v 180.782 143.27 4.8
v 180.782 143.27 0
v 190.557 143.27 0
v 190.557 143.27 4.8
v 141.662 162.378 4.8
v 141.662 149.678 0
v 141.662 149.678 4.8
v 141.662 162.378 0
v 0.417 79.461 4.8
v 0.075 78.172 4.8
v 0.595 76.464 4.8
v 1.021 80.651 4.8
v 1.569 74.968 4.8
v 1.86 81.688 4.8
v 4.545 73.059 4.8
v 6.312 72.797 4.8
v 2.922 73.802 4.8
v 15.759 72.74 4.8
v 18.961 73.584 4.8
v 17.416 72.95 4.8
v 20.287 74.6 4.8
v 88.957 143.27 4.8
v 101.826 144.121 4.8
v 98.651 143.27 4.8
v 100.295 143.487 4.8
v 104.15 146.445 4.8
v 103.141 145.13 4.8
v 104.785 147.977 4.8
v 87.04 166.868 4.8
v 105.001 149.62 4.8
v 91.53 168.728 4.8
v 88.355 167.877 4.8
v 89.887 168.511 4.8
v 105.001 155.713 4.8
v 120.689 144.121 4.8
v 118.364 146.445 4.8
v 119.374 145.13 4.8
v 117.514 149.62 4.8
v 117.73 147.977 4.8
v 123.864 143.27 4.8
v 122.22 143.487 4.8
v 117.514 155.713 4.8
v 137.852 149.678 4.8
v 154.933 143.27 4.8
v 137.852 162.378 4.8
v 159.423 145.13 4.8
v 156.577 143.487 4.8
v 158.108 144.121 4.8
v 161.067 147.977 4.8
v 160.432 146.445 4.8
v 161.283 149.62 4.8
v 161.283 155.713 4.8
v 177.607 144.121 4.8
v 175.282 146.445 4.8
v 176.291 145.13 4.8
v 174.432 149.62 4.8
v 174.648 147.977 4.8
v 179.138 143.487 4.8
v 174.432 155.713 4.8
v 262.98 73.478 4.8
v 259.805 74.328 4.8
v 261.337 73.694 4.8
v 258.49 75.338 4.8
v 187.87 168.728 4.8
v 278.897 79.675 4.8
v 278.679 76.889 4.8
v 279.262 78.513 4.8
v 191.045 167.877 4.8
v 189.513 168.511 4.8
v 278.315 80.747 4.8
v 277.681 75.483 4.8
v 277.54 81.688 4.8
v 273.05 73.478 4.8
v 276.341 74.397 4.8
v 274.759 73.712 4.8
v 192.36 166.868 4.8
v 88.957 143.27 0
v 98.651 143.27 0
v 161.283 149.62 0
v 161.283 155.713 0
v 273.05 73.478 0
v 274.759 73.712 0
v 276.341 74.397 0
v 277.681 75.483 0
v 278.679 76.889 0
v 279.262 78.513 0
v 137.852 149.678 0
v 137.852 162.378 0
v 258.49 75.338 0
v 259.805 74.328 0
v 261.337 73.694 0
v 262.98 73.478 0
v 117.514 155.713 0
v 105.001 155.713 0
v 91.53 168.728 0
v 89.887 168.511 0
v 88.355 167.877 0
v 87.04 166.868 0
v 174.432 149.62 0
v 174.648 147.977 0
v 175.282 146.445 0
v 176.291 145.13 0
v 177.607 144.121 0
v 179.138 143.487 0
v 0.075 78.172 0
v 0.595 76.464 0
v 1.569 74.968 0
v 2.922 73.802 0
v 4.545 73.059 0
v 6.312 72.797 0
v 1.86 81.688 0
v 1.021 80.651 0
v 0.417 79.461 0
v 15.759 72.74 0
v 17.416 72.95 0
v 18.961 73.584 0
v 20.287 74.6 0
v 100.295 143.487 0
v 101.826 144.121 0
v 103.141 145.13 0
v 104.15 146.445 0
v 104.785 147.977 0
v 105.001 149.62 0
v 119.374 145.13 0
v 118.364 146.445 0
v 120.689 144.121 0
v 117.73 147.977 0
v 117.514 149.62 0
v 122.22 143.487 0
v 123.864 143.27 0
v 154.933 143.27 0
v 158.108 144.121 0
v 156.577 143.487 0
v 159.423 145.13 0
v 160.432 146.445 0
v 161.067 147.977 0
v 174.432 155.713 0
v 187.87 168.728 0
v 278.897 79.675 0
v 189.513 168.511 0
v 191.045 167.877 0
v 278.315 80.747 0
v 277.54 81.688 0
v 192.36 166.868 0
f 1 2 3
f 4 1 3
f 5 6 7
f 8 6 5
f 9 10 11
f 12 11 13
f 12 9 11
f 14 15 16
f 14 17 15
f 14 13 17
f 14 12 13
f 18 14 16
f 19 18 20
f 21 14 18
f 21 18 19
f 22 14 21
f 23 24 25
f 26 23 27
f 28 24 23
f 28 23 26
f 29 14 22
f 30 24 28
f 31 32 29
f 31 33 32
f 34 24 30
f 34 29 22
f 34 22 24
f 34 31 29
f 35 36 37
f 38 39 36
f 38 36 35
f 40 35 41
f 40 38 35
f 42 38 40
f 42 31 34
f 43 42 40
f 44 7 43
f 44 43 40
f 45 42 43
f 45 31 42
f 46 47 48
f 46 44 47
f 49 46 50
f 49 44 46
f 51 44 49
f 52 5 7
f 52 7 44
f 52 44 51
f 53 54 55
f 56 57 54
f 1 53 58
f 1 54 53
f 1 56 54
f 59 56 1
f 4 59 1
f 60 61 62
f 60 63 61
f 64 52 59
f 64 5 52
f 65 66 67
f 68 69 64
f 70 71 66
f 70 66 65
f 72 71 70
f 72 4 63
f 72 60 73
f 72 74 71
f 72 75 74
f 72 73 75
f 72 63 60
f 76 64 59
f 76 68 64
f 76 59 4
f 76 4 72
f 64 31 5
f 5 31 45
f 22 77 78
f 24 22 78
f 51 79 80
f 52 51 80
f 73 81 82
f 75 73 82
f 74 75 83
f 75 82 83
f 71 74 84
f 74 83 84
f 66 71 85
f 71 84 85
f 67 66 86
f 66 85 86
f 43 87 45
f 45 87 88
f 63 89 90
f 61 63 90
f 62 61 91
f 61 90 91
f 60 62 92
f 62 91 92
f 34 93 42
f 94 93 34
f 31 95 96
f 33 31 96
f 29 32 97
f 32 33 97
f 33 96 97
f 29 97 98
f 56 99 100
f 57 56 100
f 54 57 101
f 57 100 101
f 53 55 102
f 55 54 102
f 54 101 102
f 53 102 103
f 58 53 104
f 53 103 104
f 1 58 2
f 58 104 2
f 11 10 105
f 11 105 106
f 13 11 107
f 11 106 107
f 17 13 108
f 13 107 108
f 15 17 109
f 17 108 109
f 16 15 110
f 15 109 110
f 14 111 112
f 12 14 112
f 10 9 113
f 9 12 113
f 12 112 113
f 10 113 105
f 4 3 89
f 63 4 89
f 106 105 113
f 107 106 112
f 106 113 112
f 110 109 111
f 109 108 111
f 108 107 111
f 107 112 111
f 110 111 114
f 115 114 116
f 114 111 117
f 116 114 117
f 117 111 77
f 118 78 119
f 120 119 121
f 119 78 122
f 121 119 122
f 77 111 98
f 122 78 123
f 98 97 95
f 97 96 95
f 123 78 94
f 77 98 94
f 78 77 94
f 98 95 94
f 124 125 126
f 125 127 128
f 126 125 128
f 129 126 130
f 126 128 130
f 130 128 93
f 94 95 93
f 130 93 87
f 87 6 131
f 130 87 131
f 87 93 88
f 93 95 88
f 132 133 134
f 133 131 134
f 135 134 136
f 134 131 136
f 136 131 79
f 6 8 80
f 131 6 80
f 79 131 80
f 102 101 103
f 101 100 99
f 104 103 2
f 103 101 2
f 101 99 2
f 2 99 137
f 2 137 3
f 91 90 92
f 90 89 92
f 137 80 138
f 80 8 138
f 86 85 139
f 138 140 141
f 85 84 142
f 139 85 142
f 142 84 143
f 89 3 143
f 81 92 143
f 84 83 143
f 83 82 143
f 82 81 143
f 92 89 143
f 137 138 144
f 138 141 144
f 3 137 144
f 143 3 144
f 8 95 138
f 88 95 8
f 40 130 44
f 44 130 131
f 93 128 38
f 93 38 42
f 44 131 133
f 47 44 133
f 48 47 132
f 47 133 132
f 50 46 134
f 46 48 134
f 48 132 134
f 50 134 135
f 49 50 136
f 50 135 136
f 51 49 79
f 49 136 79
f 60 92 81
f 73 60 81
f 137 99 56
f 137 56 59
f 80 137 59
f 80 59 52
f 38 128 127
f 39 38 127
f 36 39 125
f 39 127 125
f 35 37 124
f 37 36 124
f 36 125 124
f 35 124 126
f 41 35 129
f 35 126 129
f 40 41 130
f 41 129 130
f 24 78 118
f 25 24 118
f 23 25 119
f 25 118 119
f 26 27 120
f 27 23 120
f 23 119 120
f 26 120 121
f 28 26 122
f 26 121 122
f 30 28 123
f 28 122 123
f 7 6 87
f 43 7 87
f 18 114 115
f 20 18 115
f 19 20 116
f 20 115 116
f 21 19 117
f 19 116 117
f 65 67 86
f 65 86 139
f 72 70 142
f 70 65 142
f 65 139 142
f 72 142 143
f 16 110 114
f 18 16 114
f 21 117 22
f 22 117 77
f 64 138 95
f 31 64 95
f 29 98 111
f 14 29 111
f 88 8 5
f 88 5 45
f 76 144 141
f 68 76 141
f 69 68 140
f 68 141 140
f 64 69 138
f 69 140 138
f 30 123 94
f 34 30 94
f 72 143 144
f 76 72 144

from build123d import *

# Parameters (mm, degrees)
SKETCH1_W           = 279.4
SKETCH1_H           = 254
BOSS_EXTRUDE1_DEPTH = 4.800000052
SKETCH4_W           = 13.148347957
SKETCH4_H           = 12.442555781
SKETCH4_W_2         = 3.81
SKETCH4_H_2         = 12.7
SKETCH4_W_3         = 12.512633495
CUT_EXTRUDE1_DEPTH  = 378.628653575
FILLET1_R           = 6.35


with BuildPart() as part:
    # Sketch1 → Boss-Extrude1 (new body)
    with BuildSketch(Plane.XY):
        with Locations((139.7, 127)):
            Rectangle(SKETCH1_W, SKETCH1_H)
    extrude(amount=BOSS_EXTRUDE1_DEPTH)

    # Sketch4 → Cut-Extrude1 (cut, through all)
    with BuildSketch(Plane(origin=(0, 0, 0), x_dir=(-1, 0, 0), z_dir=(0, 0, -1))):
        Polygon((0, 0), (0, 72.835400266), (-18.411229684, 72.724077305), (-88.95741747, 143.27026509), (-105.001094941, 143.27026509), (-117.513728436, 143.27026509), (-161.28323771, 143.27026509), (-174.431585667, 143.27026509), (-190.55741747, 143.27026509), (-260.35, 73.47768256), (-279.4, 73.47768256), (-279.4, 0), align=None)
        Polygon((-88.9, 168.72768256), (0, 79.82768256), (0, 254), (-279.4, 254), (-279.4, 79.82768256), (-190.5, 168.72768256), align=None)
        with Locations((-167.857411689, 149.491542981)):
            Rectangle(SKETCH4_W, SKETCH4_H)
        with Locations((-139.75741747, 156.02768256)):
            Rectangle(SKETCH4_W_2, SKETCH4_H_2)
        with Locations((-111.257411689, 149.491542981)):
            Rectangle(SKETCH4_W_3, SKETCH4_H)
    extrude(amount=-CUT_EXTRUDE1_DEPTH, mode=Mode.SUBTRACT)

    # Fillet1
    # the kernel refuses this fillet: 6.35 mm, written as the material it takes off along each edge
    with BuildSketch(Plane(origin=(105.001094941, 143.27026509, -15.875), x_dir=(0, 1, 0), z_dir=(0, 0, 1)), Plane(origin=(279.4, 73.47768256, -15.875), x_dir=(0, 1, 0), z_dir=(0, 0, 1)), Plane(origin=(174.431585667, 143.27026509, -15.875), x_dir=(1, 0, 0), z_dir=(0, 0, 1)), Plane(origin=(161.28323771, 143.27026509, -15.875), x_dir=(0, 1, 0), z_dir=(0, 0, 1)), Plane(origin=(117.513728436, 143.27026509, -15.875), x_dir=(1, 0, 0), z_dir=(0, 0, 1))) as fillet1_piece_1:
        with BuildLine():
            CenterArc((FILLET1_R, FILLET1_R), FILLET1_R, 180, 90)
            Line((0, FILLET1_R), (0, 0))
            Line((0, 0), (FILLET1_R, 0))
        make_face()
    extrude(amount=36.550000052, mode=Mode.SUBTRACT)
    with BuildSketch(Plane(origin=(18.411229684, 72.724077305, -6.631938595), x_dir=(-0.9999817205970539, 0.006046360207229539, 0), z_dir=(0, 0, 1))) as fillet1_piece_2:
        with BuildLine():
            CenterArc((FILLET1_R * 0.41775991148, -FILLET1_R), FILLET1_R, 90, 45.346433032)
            Line((-FILLET1_R * 0.293609366521, -FILLET1_R * 0.297181566607), (0, 0))
            Line((0, 0), (FILLET1_R * 0.41775991148, 0))
        make_face()
    extrude(amount=18.063877241, mode=Mode.SUBTRACT)
    with BuildSketch(Plane(origin=(0, 72.835400266, -15.779302468), x_dir=(0, 1, 0), z_dir=(0, 0, 1))) as fillet1_piece_3:
        with BuildLine():
            CenterArc((FILLET1_R * 0.993971809004, -FILLET1_R), FILLET1_R, 90, 89.653566968)
            Line((-FILLET1_R * 0.00600991159307, -FILLET1_R * 0.993953639793), (0, 0))
            Line((0, 0), (FILLET1_R * 0.993971809004, 0))
        make_face()
    extrude(amount=36.358604988, mode=Mode.SUBTRACT)
    with BuildSketch(Plane(origin=(260.35, 73.47768256, -6.575640303), x_dir=(1, 0, 0), z_dir=(0, 0, 1)), Plane(origin=(190.5, 168.72768256, -6.575640303), x_dir=(-1, 0, 0), z_dir=(0, 0, 1)), Plane(origin=(279.4, 79.82768256, -6.575640303), x_dir=(-0.7071067811865475, 0.7071067811865475, 0), z_dir=(0, 0, 1)), Plane(origin=(0, 79.82768256, -6.575640303), x_dir=(0, -1, 0), z_dir=(0, 0, 1)), Plane(origin=(88.9, 168.72768256, -6.575640303), x_dir=(-0.7071067811865476, -0.7071067811865476, 0), z_dir=(0, 0, 1))) as fillet1_piece_4:
        with BuildLine():
            CenterArc((FILLET1_R * 0.414213562373, FILLET1_R), FILLET1_R, 225, 45)
            Line((-FILLET1_R * 0.292893218813, FILLET1_R * 0.292893218813), (0, 0))
            Line((0, 0), (FILLET1_R * 0.414213562373, 0))
        make_face()
    extrude(amount=17.951280657, mode=Mode.SUBTRACT)


solid = part.part
